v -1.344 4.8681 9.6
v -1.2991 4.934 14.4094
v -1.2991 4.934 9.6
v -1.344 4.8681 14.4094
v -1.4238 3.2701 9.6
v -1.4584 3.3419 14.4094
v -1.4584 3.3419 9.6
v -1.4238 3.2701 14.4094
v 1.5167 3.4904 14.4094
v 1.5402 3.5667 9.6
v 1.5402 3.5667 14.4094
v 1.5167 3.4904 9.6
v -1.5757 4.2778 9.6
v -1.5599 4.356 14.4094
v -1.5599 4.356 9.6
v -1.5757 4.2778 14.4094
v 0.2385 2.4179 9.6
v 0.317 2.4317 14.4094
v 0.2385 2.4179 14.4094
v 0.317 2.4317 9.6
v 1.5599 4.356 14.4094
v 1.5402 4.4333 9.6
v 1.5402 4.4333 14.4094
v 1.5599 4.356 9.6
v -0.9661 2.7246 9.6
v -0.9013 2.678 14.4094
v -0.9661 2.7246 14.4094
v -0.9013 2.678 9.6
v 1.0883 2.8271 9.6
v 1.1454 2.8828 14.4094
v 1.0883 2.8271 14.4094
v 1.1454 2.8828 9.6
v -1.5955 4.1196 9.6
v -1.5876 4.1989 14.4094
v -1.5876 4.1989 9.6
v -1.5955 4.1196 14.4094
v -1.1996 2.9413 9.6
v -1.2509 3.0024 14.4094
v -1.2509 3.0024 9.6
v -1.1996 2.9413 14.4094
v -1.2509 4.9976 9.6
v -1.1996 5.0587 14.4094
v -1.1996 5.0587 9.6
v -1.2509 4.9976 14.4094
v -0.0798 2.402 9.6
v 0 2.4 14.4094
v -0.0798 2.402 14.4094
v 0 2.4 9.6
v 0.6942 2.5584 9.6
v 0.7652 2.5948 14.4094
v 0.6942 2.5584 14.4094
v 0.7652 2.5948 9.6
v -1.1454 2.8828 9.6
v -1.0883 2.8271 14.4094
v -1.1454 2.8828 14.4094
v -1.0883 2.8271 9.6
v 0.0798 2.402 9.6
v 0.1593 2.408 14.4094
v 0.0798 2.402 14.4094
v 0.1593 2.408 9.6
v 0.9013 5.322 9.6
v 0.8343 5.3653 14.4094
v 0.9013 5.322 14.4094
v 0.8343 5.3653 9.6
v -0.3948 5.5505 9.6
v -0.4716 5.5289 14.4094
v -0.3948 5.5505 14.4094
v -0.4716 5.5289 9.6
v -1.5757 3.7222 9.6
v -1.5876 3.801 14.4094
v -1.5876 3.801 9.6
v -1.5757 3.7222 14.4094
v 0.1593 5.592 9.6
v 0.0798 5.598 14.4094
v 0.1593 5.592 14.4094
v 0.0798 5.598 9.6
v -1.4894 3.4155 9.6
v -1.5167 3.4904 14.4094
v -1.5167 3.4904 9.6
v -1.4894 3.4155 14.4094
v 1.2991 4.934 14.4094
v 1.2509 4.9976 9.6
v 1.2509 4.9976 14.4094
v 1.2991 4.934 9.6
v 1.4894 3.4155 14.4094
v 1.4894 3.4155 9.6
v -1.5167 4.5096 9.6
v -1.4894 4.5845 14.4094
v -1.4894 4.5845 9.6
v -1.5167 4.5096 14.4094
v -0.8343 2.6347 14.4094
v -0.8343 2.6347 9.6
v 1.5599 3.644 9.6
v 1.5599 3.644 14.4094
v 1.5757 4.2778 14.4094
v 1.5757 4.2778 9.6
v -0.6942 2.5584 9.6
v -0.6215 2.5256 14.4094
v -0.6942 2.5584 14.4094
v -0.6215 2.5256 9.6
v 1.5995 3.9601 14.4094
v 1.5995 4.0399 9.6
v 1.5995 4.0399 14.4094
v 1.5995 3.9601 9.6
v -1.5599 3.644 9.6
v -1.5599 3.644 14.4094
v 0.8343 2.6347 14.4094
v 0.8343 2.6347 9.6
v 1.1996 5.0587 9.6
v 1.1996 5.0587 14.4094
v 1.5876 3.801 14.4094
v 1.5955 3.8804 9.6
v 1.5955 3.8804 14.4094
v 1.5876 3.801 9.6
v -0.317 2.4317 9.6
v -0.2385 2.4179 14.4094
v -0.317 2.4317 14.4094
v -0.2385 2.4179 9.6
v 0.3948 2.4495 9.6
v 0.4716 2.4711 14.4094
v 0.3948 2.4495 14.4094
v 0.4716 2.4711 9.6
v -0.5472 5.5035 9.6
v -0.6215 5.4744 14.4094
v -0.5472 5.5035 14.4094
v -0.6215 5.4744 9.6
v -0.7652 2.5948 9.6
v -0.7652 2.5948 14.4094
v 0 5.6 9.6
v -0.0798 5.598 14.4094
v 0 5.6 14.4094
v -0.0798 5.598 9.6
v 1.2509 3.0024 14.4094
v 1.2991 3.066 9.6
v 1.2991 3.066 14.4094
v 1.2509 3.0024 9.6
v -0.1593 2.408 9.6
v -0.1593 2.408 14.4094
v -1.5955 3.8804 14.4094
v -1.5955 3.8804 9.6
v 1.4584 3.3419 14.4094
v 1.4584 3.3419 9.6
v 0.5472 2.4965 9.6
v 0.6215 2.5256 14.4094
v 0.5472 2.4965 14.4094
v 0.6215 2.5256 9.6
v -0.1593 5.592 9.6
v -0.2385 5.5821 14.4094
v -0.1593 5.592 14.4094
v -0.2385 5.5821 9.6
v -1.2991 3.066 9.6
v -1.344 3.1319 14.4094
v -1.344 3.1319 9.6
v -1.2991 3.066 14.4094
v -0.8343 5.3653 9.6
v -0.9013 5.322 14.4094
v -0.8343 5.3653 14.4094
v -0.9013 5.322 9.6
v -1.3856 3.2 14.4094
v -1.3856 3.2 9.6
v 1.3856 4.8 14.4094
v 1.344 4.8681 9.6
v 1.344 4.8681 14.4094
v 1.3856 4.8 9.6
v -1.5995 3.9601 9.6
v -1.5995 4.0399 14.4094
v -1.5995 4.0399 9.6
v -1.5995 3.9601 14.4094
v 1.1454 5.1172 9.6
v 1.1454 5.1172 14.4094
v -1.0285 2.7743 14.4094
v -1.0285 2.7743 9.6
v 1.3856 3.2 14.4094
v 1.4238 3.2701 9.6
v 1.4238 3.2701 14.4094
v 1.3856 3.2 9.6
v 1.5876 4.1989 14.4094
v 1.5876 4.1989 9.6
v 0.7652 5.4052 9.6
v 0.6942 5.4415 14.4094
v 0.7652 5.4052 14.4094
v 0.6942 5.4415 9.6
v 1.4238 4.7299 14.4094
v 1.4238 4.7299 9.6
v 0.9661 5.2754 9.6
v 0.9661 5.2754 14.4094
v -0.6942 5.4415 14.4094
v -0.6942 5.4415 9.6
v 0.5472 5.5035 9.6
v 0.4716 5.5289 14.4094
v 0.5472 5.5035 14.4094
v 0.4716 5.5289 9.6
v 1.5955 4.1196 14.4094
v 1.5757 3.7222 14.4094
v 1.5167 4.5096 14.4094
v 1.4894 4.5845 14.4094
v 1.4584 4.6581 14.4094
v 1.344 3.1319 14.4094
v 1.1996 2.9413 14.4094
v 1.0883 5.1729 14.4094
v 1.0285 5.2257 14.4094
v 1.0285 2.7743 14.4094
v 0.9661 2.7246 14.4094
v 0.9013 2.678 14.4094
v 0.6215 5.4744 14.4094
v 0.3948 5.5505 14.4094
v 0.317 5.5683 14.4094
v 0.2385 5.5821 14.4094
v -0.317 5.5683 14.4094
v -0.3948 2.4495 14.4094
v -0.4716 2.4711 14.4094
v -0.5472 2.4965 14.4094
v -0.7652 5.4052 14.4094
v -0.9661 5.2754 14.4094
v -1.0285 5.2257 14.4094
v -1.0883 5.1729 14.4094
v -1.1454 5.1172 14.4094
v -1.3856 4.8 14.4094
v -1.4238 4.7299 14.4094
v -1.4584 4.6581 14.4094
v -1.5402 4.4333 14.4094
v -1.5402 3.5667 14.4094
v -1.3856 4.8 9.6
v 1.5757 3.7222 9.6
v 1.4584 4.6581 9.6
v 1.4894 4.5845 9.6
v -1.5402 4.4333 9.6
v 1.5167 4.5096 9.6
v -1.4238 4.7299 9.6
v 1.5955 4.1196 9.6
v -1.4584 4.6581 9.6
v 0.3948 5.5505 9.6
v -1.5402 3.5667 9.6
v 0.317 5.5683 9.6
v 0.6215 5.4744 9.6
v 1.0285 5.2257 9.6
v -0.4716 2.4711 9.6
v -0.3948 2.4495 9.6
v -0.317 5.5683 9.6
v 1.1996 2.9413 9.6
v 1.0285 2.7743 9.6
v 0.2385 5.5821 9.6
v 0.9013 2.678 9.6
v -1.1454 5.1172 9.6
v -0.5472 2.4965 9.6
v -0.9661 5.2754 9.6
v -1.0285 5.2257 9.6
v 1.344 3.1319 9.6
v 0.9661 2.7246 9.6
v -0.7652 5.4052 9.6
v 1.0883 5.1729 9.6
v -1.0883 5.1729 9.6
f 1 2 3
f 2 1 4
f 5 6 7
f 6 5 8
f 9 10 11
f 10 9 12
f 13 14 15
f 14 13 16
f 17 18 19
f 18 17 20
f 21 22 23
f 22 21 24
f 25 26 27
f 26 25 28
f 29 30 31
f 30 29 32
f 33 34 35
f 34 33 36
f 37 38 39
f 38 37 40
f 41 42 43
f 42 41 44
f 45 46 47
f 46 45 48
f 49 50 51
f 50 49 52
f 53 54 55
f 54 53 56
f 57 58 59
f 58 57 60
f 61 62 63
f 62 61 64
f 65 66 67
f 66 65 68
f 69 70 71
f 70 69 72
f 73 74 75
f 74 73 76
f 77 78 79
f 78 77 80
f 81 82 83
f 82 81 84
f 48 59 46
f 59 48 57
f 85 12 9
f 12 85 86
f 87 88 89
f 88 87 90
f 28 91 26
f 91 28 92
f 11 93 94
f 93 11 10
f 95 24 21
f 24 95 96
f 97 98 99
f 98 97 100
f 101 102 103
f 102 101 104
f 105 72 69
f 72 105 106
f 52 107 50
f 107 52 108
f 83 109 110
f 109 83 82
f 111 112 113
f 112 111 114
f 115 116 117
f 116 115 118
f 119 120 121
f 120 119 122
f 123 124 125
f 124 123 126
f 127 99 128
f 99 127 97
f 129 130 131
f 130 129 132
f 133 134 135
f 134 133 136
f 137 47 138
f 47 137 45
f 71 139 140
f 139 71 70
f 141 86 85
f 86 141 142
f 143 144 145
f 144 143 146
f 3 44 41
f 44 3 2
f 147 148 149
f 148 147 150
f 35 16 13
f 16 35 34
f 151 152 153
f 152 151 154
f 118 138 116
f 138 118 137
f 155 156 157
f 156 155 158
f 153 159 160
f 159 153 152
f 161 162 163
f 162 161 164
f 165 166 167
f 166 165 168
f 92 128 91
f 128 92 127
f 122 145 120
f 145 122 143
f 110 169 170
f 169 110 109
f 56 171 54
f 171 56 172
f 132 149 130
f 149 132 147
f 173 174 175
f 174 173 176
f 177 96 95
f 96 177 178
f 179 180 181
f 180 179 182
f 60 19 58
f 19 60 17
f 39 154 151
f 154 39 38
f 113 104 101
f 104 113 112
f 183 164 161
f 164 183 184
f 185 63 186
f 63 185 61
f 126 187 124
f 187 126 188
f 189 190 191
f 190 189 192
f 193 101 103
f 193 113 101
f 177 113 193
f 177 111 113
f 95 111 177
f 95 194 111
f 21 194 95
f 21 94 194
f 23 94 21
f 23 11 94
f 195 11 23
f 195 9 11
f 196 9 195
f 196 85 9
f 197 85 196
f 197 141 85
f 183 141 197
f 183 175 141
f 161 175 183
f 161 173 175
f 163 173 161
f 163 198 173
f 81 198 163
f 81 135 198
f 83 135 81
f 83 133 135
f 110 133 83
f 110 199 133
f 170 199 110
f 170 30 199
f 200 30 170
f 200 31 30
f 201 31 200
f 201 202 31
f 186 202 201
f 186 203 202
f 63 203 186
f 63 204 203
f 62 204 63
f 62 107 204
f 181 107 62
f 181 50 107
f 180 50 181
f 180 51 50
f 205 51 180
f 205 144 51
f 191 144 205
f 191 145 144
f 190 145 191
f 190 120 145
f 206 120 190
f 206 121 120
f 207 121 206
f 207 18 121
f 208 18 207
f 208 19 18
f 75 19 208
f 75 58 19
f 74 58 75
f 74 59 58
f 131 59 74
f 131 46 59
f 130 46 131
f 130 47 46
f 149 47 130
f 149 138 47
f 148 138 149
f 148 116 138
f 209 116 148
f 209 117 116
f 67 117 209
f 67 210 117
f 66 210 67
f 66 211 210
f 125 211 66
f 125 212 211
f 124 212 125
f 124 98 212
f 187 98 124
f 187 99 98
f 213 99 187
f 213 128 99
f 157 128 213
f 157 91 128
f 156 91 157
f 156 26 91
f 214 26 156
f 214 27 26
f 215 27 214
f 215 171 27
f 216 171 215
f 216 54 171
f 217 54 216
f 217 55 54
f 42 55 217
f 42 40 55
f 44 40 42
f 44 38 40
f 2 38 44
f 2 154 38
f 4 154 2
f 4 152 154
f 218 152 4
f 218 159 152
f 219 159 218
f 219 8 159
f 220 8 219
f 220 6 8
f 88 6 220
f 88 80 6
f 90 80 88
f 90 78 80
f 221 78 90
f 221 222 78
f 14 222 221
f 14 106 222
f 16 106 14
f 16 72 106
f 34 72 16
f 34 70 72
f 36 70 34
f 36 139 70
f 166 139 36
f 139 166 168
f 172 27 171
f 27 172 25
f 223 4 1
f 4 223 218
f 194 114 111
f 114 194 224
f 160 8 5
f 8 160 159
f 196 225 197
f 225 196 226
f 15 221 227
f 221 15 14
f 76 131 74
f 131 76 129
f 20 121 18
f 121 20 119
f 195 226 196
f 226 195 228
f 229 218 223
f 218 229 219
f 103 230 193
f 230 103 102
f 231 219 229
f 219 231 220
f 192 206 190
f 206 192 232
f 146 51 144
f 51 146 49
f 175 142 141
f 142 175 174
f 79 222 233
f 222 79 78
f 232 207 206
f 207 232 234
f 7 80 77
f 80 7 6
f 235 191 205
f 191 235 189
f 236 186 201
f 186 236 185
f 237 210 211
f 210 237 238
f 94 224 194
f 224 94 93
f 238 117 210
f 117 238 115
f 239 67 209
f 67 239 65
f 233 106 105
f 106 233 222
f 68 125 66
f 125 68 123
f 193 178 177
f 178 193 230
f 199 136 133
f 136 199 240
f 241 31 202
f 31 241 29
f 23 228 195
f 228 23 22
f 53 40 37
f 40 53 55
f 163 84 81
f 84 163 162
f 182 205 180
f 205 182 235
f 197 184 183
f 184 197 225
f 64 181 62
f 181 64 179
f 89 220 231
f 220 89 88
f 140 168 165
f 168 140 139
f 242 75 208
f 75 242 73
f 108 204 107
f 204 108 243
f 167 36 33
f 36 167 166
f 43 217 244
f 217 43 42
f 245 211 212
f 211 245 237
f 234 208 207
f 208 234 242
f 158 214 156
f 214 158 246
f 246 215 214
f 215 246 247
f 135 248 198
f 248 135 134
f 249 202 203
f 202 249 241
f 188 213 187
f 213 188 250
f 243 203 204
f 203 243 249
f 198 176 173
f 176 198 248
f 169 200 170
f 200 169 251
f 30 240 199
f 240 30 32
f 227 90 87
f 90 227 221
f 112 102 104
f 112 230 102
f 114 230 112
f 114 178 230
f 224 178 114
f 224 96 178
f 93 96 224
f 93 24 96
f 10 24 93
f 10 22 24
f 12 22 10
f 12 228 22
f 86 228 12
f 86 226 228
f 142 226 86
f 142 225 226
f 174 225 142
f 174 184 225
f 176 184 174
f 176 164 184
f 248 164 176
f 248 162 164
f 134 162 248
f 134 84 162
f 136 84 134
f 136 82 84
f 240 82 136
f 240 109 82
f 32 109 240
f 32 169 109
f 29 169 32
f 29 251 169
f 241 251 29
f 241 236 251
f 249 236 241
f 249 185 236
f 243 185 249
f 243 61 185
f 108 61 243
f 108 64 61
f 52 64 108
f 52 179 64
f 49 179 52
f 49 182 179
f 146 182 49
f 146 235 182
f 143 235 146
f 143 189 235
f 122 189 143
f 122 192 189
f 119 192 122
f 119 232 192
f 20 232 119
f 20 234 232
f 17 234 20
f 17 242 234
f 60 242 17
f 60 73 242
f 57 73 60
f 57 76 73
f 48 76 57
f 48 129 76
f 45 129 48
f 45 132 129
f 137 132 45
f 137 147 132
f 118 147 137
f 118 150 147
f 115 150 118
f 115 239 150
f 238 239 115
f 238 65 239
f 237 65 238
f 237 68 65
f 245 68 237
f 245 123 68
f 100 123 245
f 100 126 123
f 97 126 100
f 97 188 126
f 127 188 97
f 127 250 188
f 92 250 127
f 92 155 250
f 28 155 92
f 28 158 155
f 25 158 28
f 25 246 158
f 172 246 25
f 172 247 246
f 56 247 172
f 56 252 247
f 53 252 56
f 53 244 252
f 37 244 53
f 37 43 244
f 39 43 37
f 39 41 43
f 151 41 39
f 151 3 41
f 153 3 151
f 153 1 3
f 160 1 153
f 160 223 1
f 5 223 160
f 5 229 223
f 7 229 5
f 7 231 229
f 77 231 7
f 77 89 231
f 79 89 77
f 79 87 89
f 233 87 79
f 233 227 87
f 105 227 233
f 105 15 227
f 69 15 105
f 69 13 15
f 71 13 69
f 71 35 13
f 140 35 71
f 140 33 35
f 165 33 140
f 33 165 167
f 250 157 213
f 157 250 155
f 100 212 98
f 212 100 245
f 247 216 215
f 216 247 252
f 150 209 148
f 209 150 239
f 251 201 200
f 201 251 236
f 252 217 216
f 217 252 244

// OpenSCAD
use <../lib.scad>
use <s/68881p01s01.scad>
use <s/68881s01.scad>
use <s/68881s02.scad>
$fa=1; $fs=0.2;
function ldraw_lib__68881p02(realsolid=false) = [
// 0 Brick 10 x  5 x  2.667 Semi Circle with Curved Top with Black Frame and Two Black Eyes Pattern
// 0 Name: 68881p02.dat
// 0 Author: Gerald Lasser [GeraldLasser]
// 0 !LDRAW_ORG Part UPDATE 2022-03
// 0 !LICENSE Licensed under CC BY 2.0 and CC BY 4.0 : see CAreadme.txt
// 
// 0 BFC CERTIFY CCW
  [0,"BFC","CERTIFY"],
  [0,"BFC","CCW"],
// 
// 0 !KEYWORDS Bricklink 68881pb002, Mickey Mouse, Set 43179, Walt Disney
// 
// 0 !HISTORY 2022-05-07 [PTadmin] Official Update 2022-03
// 
// 
// 1 16 0 0 0 1 0 0 0 1 0 0 0 1 s\68881s02.dat
  [1,16,0,0,0,1,0,0,0,1,0,0,0,1, ldraw_lib__s__68881s02(realsolid)],
// 1 0 0 0 0 1 0 0 0 1 0 0 0 1 s\68881s01.dat
  [1,0,0,0,0,1,0,0,0,1,0,0,0,1, ldraw_lib__s__68881s01(realsolid)],
// 1 0 0 0 0 -1 0 0 0 1 0 0 0 1 s\68881s01.dat
  [1,0,0,0,0,-1,0,0,0,1,0,0,0,1, ldraw_lib__s__68881s01(realsolid)],
// 
// 0 // Pattern
// 1 16 0 0 0 1 0 0 0 1 0 0 0 1 s\68881p01s01.dat
  [1,16,0,0,0,1,0,0,0,1,0,0,0,1, ldraw_lib__s__68881p01s01(realsolid)],
// 
// 4 16 -76.5143 -6.1004 58.7116 -74.7796 -8.0038 57.3804 -66.6502 -8.0038 66.6502 -68.4 -5.8471 68.4
  [4,16,-76.5143,-6.1004,58.7116,-74.7796,-8.0038,57.3804,-66.6502,-8.0038,66.6502,-68.4,-5.8471,68.4],
// 3 16 -42.7858 -8.0038 83.7712 -47.5121 -7.3358 82.293 -47.1288 -8.0038 81.6295
  [3,16,-42.7858,-8.0038,83.7712,-47.5121,-7.3358,82.293,-47.1288,-8.0038,81.6295],
// 4 16 -82.8412 -6.784 47.8287 -81.6295 -8.0038 47.1288 -74.7796 -8.0038 57.3804 -76.5143 -6.1004 58.7116
  [4,16,-82.8412,-6.784,47.8287,-81.6295,-8.0038,47.1288,-74.7796,-8.0038,57.3804,-76.5143,-6.1004,58.7116],
// 4 16 -68.4 -5.8471 68.4 -66.6502 -8.0038 66.6502 -57.3804 -8.0038 74.7796 -58.6521 -6.1855 76.4368
  [4,16,-68.4,-5.8471,68.4,-66.6502,-8.0038,66.6502,-57.3804,-8.0038,74.7796,-58.6521,-6.1855,76.4368],
// 4 16 -58.6521 -6.1855 76.4368 -57.3804 -8.0038 74.7796 -47.1288 -8.0038 81.6295 -47.5121 -7.3358 82.293
  [4,16,-58.6521,-6.1855,76.4368,-57.3804,-8.0038,74.7796,-47.1288,-8.0038,81.6295,-47.5121,-7.3358,82.293],
// 4 16 -74.7796 -8.0038 57.3804 -81.6295 -8.0038 47.1288 -67.0456 -19.256 38.7088 -61.4195 -19.256 47.1288
  [4,16,-74.7796,-8.0038,57.3804,-81.6295,-8.0038,47.1288,-67.0456,-19.256,38.7088,-61.4195,-19.256,47.1288],
// 4 16 -74.7796 -8.0038 57.3804 -61.4195 -19.256 47.1288 -54.7425 -19.256 54.7425 -66.6502 -8.0038 66.6502
  [4,16,-74.7796,-8.0038,57.3804,-61.4195,-19.256,47.1288,-54.7425,-19.256,54.7425,-66.6502,-8.0038,66.6502],
// 4 16 -13.20757 -19.256 76.13807 -20.0371 -19.256 74.7796 -15.3358 -28.2139 57.2338 -7.734 -28.2139 58.7459
  [4,16,-13.20757,-19.256,76.13807,-20.0371,-19.256,74.7796,-15.3358,-28.2139,57.2338,-7.734,-28.2139,58.7459],
// 3 16 -13.20757 -19.256 76.13807 -7.734 -28.2139 58.7459 -9.3465 -22.12171 70.99388
  [3,16,-13.20757,-19.256,76.13807,-7.734,-28.2139,58.7459,-9.3465,-22.12171,70.99388],
// 4 16 -7.734 -28.2139 58.7459 -15.3358 -28.2139 57.2338 -14.09717 -29.83841 52.6112 -11.51337 -31.91173 46.91099
  [4,16,-7.734,-28.2139,58.7459,-15.3358,-28.2139,57.2338,-14.09717,-29.83841,52.6112,-11.51337,-31.91173,46.91099],
// 4 16 -7.734 -28.2139 58.7459 -11.51337 -31.91173 46.91099 -10.14783 -33.70625 41.80409 -5.2307 -34.7241 39.7314
  [4,16,-7.734,-28.2139,58.7459,-11.51337,-31.91173,46.91099,-10.14783,-33.70625,41.80409,-5.2307,-34.7241,39.7314],
// 3 16 -10.14783 -33.70625 41.80409 -9.69845 -34.7241 38.84277 -5.2307 -34.7241 39.7314
  [3,16,-10.14783,-33.70625,41.80409,-9.69845,-34.7241,38.84277,-5.2307,-34.7241,39.7314],
// 4 16 -29.1 -10.8882 84.9 -35.20693 -9.51215 84.99713 -29.6264 -19.256 71.5245 -22.24381 -13.55913 83.01506
  [4,16,-29.1,-10.8882,84.9,-35.20693,-9.51215,84.99713,-29.6264,-19.256,71.5245,-22.24381,-13.55913,83.01506],
// 3 16 -22.24381 -13.55913 83.01506 -29.6264 -19.256 71.5245 -20.0371 -19.256 74.7796
  [3,16,-22.24381,-13.55913,83.01506,-29.6264,-19.256,71.5245,-20.0371,-19.256,74.7796],
// 3 16 -15.3358 -28.2139 57.2338 -17.07239 -28.2139 56.64432 -15.59034 -28.88606 55.06078
  [3,16,-15.3358,-28.2139,57.2338,-17.07239,-28.2139,56.64432,-15.59034,-28.88606,55.06078],
// 3 16 -15.3358 -28.2139 57.2338 -15.59034 -28.88606 55.06078 -14.09717 -29.83841 52.6112
  [3,16,-15.3358,-28.2139,57.2338,-15.59034,-28.88606,55.06078,-14.09717,-29.83841,52.6112],
// 3 16 -38.7088 -19.256 67.0456 -31.91271 -25.95893 55.27449 -29.45491 -25.38097 57.79048
  [3,16,-38.7088,-19.256,67.0456,-31.91271,-25.95893,55.27449,-29.45491,-25.38097,57.79048],
// 4 16 -38.7088 -19.256 67.0456 -29.45491 -25.38097 57.79048 -26.68285 -25.24183 59.47142 -29.6264 -19.256 71.5245
  [4,16,-38.7088,-19.256,67.0456,-29.45491,-25.38097,57.79048,-26.68285,-25.24183,59.47142,-29.6264,-19.256,71.5245],
// 3 16 -29.6264 -19.256 71.5245 -26.68285 -25.24183 59.47142 -24.78837 -25.4906 59.84441
  [3,16,-29.6264,-19.256,71.5245,-26.68285,-25.24183,59.47142,-24.78837,-25.4906,59.84441],
// 4 16 -47.1288 -19.256 61.4195 -38.7088 -19.256 67.0456 -47.1288 -8.0038 81.6295 -57.3804 -8.0038 74.7796
  [4,16,-47.1288,-19.256,61.4195,-38.7088,-19.256,67.0456,-47.1288,-8.0038,81.6295,-57.3804,-8.0038,74.7796],
// 4 16 -47.1288 -19.256 61.4195 -36.0708 -28.2139 47.0084 -34.24892 -26.91481 51.38723 -38.7088 -19.256 67.0456
  [4,16,-47.1288,-19.256,61.4195,-36.0708,-28.2139,47.0084,-34.24892,-26.91481,51.38723,-38.7088,-19.256,67.0456],
// 3 16 -38.7088 -19.256 67.0456 -34.24892 -26.91481 51.38723 -31.91271 -25.95893 55.27449
  [3,16,-38.7088,-19.256,67.0456,-34.24892,-26.91481,51.38723,-31.91271,-25.95893,55.27449],
// 4 16 -47.1288 -19.256 61.4195 -57.3804 -8.0038 74.7796 -66.6502 -8.0038 66.6502 -54.7425 -19.256 54.7425
  [4,16,-47.1288,-19.256,61.4195,-57.3804,-8.0038,74.7796,-66.6502,-8.0038,66.6502,-54.7425,-19.256,54.7425],
// 4 16 -35.20693 -9.51215 84.99713 -42.78581 -8.0038 83.77123 -47.1288 -8.0038 81.6295 -38.7088 -19.256 67.0456
  [4,16,-35.20693,-9.51215,84.99713,-42.78581,-8.0038,83.77123,-47.1288,-8.0038,81.6295,-38.7088,-19.256,67.0456],
// 3 16 -35.20693 -9.51215 84.99713 -38.7088 -19.256 67.0456 -29.6264 -19.256 71.5245
  [3,16,-35.20693,-9.51215,84.99713,-38.7088,-19.256,67.0456,-29.6264,-19.256,71.5245],
// 4 16 -29.6264 -19.256 71.5245 -24.78837 -25.4906 59.84441 -23.8 -25.55655 60.039 -20.0371 -19.256 74.7796
  [4,16,-29.6264,-19.256,71.5245,-24.78837,-25.4906,59.84441,-23.8,-25.55655,60.039,-20.0371,-19.256,74.7796],
// 3 16 -20.0371 -19.256 74.7796 -23.8 -25.55655 60.039 -20.91715 -26.28012 59.47142
  [3,16,-20.0371,-19.256,74.7796,-23.8,-25.55655,60.039,-20.91715,-26.28012,59.47142],
// 4 16 -20.0371 -19.256 74.7796 -20.91715 -26.28012 59.47142 -18.14509 -27.50712 57.79048 -15.3358 -28.2139 57.2338
  [4,16,-20.0371,-19.256,74.7796,-20.91715,-26.28012,59.47142,-18.14509,-27.50712,57.79048,-15.3358,-28.2139,57.2338],
// 3 16 -18.14509 -27.50712 57.79048 -17.07239 -28.2139 56.64432 -15.3358 -28.2139 57.2338
  [3,16,-18.14509,-27.50712,57.79048,-17.07239,-28.2139,56.64432,-15.3358,-28.2139,57.2338],
// 4 16 -17.7 -16.00149 80.2 -22.24381 -13.55913 83.01506 -20.0371 -19.256 74.7796 -13.20757 -19.256 76.13807
  [4,16,-17.7,-16.00149,80.2,-22.24381,-13.55913,83.01506,-20.0371,-19.256,74.7796,-13.20757,-19.256,76.13807],
// 4 16 -5.5 -25.30055 64.8 -9.3465 -22.12171 70.99388 -7.734 -28.2139 58.7459 -2.60538 -28.2139 59.08204
  [4,16,-5.5,-25.30055,64.8,-9.3465,-22.12171,70.99388,-7.734,-28.2139,58.7459,-2.60538,-28.2139,59.08204],
// 3 16 -2.24054 -28.65478 57.80716 -2.60538 -28.2139 59.08204 -7.734 -28.2139 58.7459
  [3,16,-2.24054,-28.65478,57.80716,-2.60538,-28.2139,59.08204,-7.734,-28.2139,58.7459],
// 4 16 -7.734 -28.2139 58.7459 -5.2307 -34.7241 39.7314 -1.84776 -29.12942 56.43463 -2.24054 -28.65478 57.80716
  [4,16,-7.734,-28.2139,58.7459,-5.2307,-34.7241,39.7314,-1.84776,-29.12942,56.43463,-2.24054,-28.65478,57.80716],
// 4 16 -5.2307 -34.7241 39.7314 0 -34.7241 40.0743 0 -29.58964 55.2 -.76537 -29.52092 55.35224
  [4,16,-5.2307,-34.7241,39.7314,0,-34.7241,40.0743,0,-29.58964,55.2,-.76537,-29.52092,55.35224],
// 3 16 -1.41421 -29.35932 55.78579 -5.2307 -34.7241 39.7314 -.76537 -29.52092 55.35224
  [3,16,-1.41421,-29.35932,55.78579,-5.2307,-34.7241,39.7314,-.76537,-29.52092,55.35224],
// 3 16 -1.84776 -29.12942 56.43463 -5.2307 -34.7241 39.7314 -1.41421 -29.35932 55.78579
  [3,16,-1.84776,-29.12942,56.43463,-5.2307,-34.7241,39.7314,-1.41421,-29.35932,55.78579],
// 
// 4 16 66.6502 -8.0038 66.6502 74.7796 -8.0038 57.3804 76.5143 -6.1004 58.7116 68.4 -5.8471 68.4
  [4,16,66.6502,-8.0038,66.6502,74.7796,-8.0038,57.3804,76.5143,-6.1004,58.7116,68.4,-5.8471,68.4],
// 3 16 47.5121 -7.3358 82.293 42.7858 -8.0038 83.7712 47.1288 -8.0038 81.6295
  [3,16,47.5121,-7.3358,82.293,42.7858,-8.0038,83.7712,47.1288,-8.0038,81.6295],
// 4 16 74.7796 -8.0038 57.3804 81.6295 -8.0038 47.1288 82.8412 -6.784 47.8287 76.5143 -6.1004 58.7116
  [4,16,74.7796,-8.0038,57.3804,81.6295,-8.0038,47.1288,82.8412,-6.784,47.8287,76.5143,-6.1004,58.7116],
// 4 16 57.3804 -8.0038 74.7796 66.6502 -8.0038 66.6502 68.4 -5.8471 68.4 58.6521 -6.1855 76.4368
  [4,16,57.3804,-8.0038,74.7796,66.6502,-8.0038,66.6502,68.4,-5.8471,68.4,58.6521,-6.1855,76.4368],
// 4 16 47.1288 -8.0038 81.6295 57.3804 -8.0038 74.7796 58.6521 -6.1855 76.4368 47.5121 -7.3358 82.293
  [4,16,47.1288,-8.0038,81.6295,57.3804,-8.0038,74.7796,58.6521,-6.1855,76.4368,47.5121,-7.3358,82.293],
// 4 16 67.0456 -19.256 38.7088 81.6295 -8.0038 47.1288 74.7796 -8.0038 57.3804 61.4195 -19.256 47.1288
  [4,16,67.0456,-19.256,38.7088,81.6295,-8.0038,47.1288,74.7796,-8.0038,57.3804,61.4195,-19.256,47.1288],
// 4 16 54.7425 -19.256 54.7425 61.4195 -19.256 47.1288 74.7796 -8.0038 57.3804 66.6502 -8.0038 66.6502
  [4,16,54.7425,-19.256,54.7425,61.4195,-19.256,47.1288,74.7796,-8.0038,57.3804,66.6502,-8.0038,66.6502],
// 4 16 15.3358 -28.2139 57.2338 20.0371 -19.256 74.7796 13.20757 -19.256 76.13807 7.734 -28.2139 58.7459
  [4,16,15.3358,-28.2139,57.2338,20.0371,-19.256,74.7796,13.20757,-19.256,76.13807,7.734,-28.2139,58.7459],
// 3 16 7.734 -28.2139 58.7459 13.20757 -19.256 76.13807 9.3465 -22.12171 70.99388
  [3,16,7.734,-28.2139,58.7459,13.20757,-19.256,76.13807,9.3465,-22.12171,70.99388],
// 4 16 14.09717 -29.83841 52.6112 15.3358 -28.2139 57.2338 7.734 -28.2139 58.7459 11.51337 -31.91173 46.91099
  [4,16,14.09717,-29.83841,52.6112,15.3358,-28.2139,57.2338,7.734,-28.2139,58.7459,11.51337,-31.91173,46.91099],
// 4 16 10.14783 -33.70625 41.80409 11.51337 -31.91173 46.91099 7.734 -28.2139 58.7459 5.2307 -34.7241 39.7314
  [4,16,10.14783,-33.70625,41.80409,11.51337,-31.91173,46.91099,7.734,-28.2139,58.7459,5.2307,-34.7241,39.7314],
// 3 16 9.69845 -34.7241 38.84277 10.14783 -33.70625 41.80409 5.2307 -34.7241 39.7314
  [3,16,9.69845,-34.7241,38.84277,10.14783,-33.70625,41.80409,5.2307,-34.7241,39.7314],
// 4 16 29.6264 -19.256 71.5245 35.20693 -9.51215 84.99713 29.1 -10.8882 84.9 22.24381 -13.55913 83.01506
  [4,16,29.6264,-19.256,71.5245,35.20693,-9.51215,84.99713,29.1,-10.8882,84.9,22.24381,-13.55913,83.01506],
// 3 16 29.6264 -19.256 71.5245 22.24381 -13.55913 83.01506 20.0371 -19.256 74.7796
  [3,16,29.6264,-19.256,71.5245,22.24381,-13.55913,83.01506,20.0371,-19.256,74.7796],
// 3 16 17.07239 -28.2139 56.64432 15.3358 -28.2139 57.2338 15.59034 -28.88606 55.06078
  [3,16,17.07239,-28.2139,56.64432,15.3358,-28.2139,57.2338,15.59034,-28.88606,55.06078],
// 3 16 15.59034 -28.88606 55.06078 15.3358 -28.2139 57.2338 14.09717 -29.83841 52.6112
  [3,16,15.59034,-28.88606,55.06078,15.3358,-28.2139,57.2338,14.09717,-29.83841,52.6112],
// 3 16 31.91271 -25.95893 55.27449 38.7088 -19.256 67.0456 29.45491 -25.38097 57.79048
  [3,16,31.91271,-25.95893,55.27449,38.7088,-19.256,67.0456,29.45491,-25.38097,57.79048],
// 4 16 26.68285 -25.24183 59.47142 29.45491 -25.38097 57.79048 38.7088 -19.256 67.0456 29.6264 -19.256 71.5245
  [4,16,26.68285,-25.24183,59.47142,29.45491,-25.38097,57.79048,38.7088,-19.256,67.0456,29.6264,-19.256,71.5245],
// 3 16 26.68285 -25.24183 59.47142 29.6264 -19.256 71.5245 24.78837 -25.4906 59.84441
  [3,16,26.68285,-25.24183,59.47142,29.6264,-19.256,71.5245,24.78837,-25.4906,59.84441],
// 4 16 47.1288 -8.0038 81.6295 38.7088 -19.256 67.0456 47.1288 -19.256 61.4195 57.3804 -8.0038 74.7796
  [4,16,47.1288,-8.0038,81.6295,38.7088,-19.256,67.0456,47.1288,-19.256,61.4195,57.3804,-8.0038,74.7796],
// 4 16 34.24892 -26.91481 51.38723 36.0708 -28.2139 47.0084 47.1288 -19.256 61.4195 38.7088 -19.256 67.0456
  [4,16,34.24892,-26.91481,51.38723,36.0708,-28.2139,47.0084,47.1288,-19.256,61.4195,38.7088,-19.256,67.0456],
// 3 16 34.24892 -26.91481 51.38723 38.7088 -19.256 67.0456 31.91271 -25.95893 55.27449
  [3,16,34.24892,-26.91481,51.38723,38.7088,-19.256,67.0456,31.91271,-25.95893,55.27449],
// 4 16 66.6502 -8.0038 66.6502 57.3804 -8.0038 74.7796 47.1288 -19.256 61.4195 54.7425 -19.256 54.7425
  [4,16,66.6502,-8.0038,66.6502,57.3804,-8.0038,74.7796,47.1288,-19.256,61.4195,54.7425,-19.256,54.7425],
// 4 16 47.1288 -8.0038 81.6295 42.78581 -8.0038 83.77123 35.20693 -9.51215 84.99713 38.7088 -19.256 67.0456
  [4,16,47.1288,-8.0038,81.6295,42.78581,-8.0038,83.77123,35.20693,-9.51215,84.99713,38.7088,-19.256,67.0456],
// 3 16 38.7088 -19.256 67.0456 35.20693 -9.51215 84.99713 29.6264 -19.256 71.5245
  [3,16,38.7088,-19.256,67.0456,35.20693,-9.51215,84.99713,29.6264,-19.256,71.5245],
// 4 16 23.8 -25.55655 60.039 24.78837 -25.4906 59.84441 29.6264 -19.256 71.5245 20.0371 -19.256 74.7796
  [4,16,23.8,-25.55655,60.039,24.78837,-25.4906,59.84441,29.6264,-19.256,71.5245,20.0371,-19.256,74.7796],
// 3 16 23.8 -25.55655 60.039 20.0371 -19.256 74.7796 20.91715 -26.28012 59.47142
  [3,16,23.8,-25.55655,60.039,20.0371,-19.256,74.7796,20.91715,-26.28012,59.47142],
// 4 16 18.14509 -27.50712 57.79048 20.91715 -26.28012 59.47142 20.0371 -19.256 74.7796 15.3358 -28.2139 57.2338
  [4,16,18.14509,-27.50712,57.79048,20.91715,-26.28012,59.47142,20.0371,-19.256,74.7796,15.3358,-28.2139,57.2338],
// 3 16 17.07239 -28.2139 56.64432 18.14509 -27.50712 57.79048 15.3358 -28.2139 57.2338
  [3,16,17.07239,-28.2139,56.64432,18.14509,-27.50712,57.79048,15.3358,-28.2139,57.2338],
// 4 16 20.0371 -19.256 74.7796 22.24381 -13.55913 83.01506 17.7 -16.00149 80.2 13.20757 -19.256 76.13807
  [4,16,20.0371,-19.256,74.7796,22.24381,-13.55913,83.01506,17.7,-16.00149,80.2,13.20757,-19.256,76.13807],
// 4 16 7.734 -28.2139 58.7459 9.3465 -22.12171 70.99388 5.5 -25.30055 64.8 2.60538 -28.2139 59.08204
  [4,16,7.734,-28.2139,58.7459,9.3465,-22.12171,70.99388,5.5,-25.30055,64.8,2.60538,-28.2139,59.08204],
// 4 16 1.84776 -29.12942 56.43463 5.2307 -34.7241 39.7314 7.734 -28.2139 58.7459 2.24054 -28.65478 57.80716
  [4,16,1.84776,-29.12942,56.43463,5.2307,-34.7241,39.7314,7.734,-28.2139,58.7459,2.24054,-28.65478,57.80716],
// 3 16 2.60538 -28.2139 59.08204 2.24054 -28.65478 57.80716 7.734 -28.2139 58.7459
  [3,16,2.60538,-28.2139,59.08204,2.24054,-28.65478,57.80716,7.734,-28.2139,58.7459],
// 4 16 0 -29.58964 55.2 0 -34.7241 40.0743 5.2307 -34.7241 39.7314 .76537 -29.52092 55.35224
  [4,16,0,-29.58964,55.2,0,-34.7241,40.0743,5.2307,-34.7241,39.7314,.76537,-29.52092,55.35224],
// 3 16 5.2307 -34.7241 39.7314 1.41421 -29.35932 55.78579 .76537 -29.52092 55.35224
  [3,16,5.2307,-34.7241,39.7314,1.41421,-29.35932,55.78579,.76537,-29.52092,55.35224],
// 3 16 5.2307 -34.7241 39.7314 1.84776 -29.12942 56.43463 1.41421 -29.35932 55.78579
  [3,16,5.2307,-34.7241,39.7314,1.84776,-29.12942,56.43463,1.41421,-29.35932,55.78579],
];
module ldraw_lib__68881p02(step=0, col=false, unit=2/5, alt=false, line=0.2, solid=!$preview)
    makepoly(ldraw_lib__68881p02(solid), step=step, col=col, unit=unit, alt=alt, line=line, solid=solid);
ldraw_lib__68881p02(line=0.2);
